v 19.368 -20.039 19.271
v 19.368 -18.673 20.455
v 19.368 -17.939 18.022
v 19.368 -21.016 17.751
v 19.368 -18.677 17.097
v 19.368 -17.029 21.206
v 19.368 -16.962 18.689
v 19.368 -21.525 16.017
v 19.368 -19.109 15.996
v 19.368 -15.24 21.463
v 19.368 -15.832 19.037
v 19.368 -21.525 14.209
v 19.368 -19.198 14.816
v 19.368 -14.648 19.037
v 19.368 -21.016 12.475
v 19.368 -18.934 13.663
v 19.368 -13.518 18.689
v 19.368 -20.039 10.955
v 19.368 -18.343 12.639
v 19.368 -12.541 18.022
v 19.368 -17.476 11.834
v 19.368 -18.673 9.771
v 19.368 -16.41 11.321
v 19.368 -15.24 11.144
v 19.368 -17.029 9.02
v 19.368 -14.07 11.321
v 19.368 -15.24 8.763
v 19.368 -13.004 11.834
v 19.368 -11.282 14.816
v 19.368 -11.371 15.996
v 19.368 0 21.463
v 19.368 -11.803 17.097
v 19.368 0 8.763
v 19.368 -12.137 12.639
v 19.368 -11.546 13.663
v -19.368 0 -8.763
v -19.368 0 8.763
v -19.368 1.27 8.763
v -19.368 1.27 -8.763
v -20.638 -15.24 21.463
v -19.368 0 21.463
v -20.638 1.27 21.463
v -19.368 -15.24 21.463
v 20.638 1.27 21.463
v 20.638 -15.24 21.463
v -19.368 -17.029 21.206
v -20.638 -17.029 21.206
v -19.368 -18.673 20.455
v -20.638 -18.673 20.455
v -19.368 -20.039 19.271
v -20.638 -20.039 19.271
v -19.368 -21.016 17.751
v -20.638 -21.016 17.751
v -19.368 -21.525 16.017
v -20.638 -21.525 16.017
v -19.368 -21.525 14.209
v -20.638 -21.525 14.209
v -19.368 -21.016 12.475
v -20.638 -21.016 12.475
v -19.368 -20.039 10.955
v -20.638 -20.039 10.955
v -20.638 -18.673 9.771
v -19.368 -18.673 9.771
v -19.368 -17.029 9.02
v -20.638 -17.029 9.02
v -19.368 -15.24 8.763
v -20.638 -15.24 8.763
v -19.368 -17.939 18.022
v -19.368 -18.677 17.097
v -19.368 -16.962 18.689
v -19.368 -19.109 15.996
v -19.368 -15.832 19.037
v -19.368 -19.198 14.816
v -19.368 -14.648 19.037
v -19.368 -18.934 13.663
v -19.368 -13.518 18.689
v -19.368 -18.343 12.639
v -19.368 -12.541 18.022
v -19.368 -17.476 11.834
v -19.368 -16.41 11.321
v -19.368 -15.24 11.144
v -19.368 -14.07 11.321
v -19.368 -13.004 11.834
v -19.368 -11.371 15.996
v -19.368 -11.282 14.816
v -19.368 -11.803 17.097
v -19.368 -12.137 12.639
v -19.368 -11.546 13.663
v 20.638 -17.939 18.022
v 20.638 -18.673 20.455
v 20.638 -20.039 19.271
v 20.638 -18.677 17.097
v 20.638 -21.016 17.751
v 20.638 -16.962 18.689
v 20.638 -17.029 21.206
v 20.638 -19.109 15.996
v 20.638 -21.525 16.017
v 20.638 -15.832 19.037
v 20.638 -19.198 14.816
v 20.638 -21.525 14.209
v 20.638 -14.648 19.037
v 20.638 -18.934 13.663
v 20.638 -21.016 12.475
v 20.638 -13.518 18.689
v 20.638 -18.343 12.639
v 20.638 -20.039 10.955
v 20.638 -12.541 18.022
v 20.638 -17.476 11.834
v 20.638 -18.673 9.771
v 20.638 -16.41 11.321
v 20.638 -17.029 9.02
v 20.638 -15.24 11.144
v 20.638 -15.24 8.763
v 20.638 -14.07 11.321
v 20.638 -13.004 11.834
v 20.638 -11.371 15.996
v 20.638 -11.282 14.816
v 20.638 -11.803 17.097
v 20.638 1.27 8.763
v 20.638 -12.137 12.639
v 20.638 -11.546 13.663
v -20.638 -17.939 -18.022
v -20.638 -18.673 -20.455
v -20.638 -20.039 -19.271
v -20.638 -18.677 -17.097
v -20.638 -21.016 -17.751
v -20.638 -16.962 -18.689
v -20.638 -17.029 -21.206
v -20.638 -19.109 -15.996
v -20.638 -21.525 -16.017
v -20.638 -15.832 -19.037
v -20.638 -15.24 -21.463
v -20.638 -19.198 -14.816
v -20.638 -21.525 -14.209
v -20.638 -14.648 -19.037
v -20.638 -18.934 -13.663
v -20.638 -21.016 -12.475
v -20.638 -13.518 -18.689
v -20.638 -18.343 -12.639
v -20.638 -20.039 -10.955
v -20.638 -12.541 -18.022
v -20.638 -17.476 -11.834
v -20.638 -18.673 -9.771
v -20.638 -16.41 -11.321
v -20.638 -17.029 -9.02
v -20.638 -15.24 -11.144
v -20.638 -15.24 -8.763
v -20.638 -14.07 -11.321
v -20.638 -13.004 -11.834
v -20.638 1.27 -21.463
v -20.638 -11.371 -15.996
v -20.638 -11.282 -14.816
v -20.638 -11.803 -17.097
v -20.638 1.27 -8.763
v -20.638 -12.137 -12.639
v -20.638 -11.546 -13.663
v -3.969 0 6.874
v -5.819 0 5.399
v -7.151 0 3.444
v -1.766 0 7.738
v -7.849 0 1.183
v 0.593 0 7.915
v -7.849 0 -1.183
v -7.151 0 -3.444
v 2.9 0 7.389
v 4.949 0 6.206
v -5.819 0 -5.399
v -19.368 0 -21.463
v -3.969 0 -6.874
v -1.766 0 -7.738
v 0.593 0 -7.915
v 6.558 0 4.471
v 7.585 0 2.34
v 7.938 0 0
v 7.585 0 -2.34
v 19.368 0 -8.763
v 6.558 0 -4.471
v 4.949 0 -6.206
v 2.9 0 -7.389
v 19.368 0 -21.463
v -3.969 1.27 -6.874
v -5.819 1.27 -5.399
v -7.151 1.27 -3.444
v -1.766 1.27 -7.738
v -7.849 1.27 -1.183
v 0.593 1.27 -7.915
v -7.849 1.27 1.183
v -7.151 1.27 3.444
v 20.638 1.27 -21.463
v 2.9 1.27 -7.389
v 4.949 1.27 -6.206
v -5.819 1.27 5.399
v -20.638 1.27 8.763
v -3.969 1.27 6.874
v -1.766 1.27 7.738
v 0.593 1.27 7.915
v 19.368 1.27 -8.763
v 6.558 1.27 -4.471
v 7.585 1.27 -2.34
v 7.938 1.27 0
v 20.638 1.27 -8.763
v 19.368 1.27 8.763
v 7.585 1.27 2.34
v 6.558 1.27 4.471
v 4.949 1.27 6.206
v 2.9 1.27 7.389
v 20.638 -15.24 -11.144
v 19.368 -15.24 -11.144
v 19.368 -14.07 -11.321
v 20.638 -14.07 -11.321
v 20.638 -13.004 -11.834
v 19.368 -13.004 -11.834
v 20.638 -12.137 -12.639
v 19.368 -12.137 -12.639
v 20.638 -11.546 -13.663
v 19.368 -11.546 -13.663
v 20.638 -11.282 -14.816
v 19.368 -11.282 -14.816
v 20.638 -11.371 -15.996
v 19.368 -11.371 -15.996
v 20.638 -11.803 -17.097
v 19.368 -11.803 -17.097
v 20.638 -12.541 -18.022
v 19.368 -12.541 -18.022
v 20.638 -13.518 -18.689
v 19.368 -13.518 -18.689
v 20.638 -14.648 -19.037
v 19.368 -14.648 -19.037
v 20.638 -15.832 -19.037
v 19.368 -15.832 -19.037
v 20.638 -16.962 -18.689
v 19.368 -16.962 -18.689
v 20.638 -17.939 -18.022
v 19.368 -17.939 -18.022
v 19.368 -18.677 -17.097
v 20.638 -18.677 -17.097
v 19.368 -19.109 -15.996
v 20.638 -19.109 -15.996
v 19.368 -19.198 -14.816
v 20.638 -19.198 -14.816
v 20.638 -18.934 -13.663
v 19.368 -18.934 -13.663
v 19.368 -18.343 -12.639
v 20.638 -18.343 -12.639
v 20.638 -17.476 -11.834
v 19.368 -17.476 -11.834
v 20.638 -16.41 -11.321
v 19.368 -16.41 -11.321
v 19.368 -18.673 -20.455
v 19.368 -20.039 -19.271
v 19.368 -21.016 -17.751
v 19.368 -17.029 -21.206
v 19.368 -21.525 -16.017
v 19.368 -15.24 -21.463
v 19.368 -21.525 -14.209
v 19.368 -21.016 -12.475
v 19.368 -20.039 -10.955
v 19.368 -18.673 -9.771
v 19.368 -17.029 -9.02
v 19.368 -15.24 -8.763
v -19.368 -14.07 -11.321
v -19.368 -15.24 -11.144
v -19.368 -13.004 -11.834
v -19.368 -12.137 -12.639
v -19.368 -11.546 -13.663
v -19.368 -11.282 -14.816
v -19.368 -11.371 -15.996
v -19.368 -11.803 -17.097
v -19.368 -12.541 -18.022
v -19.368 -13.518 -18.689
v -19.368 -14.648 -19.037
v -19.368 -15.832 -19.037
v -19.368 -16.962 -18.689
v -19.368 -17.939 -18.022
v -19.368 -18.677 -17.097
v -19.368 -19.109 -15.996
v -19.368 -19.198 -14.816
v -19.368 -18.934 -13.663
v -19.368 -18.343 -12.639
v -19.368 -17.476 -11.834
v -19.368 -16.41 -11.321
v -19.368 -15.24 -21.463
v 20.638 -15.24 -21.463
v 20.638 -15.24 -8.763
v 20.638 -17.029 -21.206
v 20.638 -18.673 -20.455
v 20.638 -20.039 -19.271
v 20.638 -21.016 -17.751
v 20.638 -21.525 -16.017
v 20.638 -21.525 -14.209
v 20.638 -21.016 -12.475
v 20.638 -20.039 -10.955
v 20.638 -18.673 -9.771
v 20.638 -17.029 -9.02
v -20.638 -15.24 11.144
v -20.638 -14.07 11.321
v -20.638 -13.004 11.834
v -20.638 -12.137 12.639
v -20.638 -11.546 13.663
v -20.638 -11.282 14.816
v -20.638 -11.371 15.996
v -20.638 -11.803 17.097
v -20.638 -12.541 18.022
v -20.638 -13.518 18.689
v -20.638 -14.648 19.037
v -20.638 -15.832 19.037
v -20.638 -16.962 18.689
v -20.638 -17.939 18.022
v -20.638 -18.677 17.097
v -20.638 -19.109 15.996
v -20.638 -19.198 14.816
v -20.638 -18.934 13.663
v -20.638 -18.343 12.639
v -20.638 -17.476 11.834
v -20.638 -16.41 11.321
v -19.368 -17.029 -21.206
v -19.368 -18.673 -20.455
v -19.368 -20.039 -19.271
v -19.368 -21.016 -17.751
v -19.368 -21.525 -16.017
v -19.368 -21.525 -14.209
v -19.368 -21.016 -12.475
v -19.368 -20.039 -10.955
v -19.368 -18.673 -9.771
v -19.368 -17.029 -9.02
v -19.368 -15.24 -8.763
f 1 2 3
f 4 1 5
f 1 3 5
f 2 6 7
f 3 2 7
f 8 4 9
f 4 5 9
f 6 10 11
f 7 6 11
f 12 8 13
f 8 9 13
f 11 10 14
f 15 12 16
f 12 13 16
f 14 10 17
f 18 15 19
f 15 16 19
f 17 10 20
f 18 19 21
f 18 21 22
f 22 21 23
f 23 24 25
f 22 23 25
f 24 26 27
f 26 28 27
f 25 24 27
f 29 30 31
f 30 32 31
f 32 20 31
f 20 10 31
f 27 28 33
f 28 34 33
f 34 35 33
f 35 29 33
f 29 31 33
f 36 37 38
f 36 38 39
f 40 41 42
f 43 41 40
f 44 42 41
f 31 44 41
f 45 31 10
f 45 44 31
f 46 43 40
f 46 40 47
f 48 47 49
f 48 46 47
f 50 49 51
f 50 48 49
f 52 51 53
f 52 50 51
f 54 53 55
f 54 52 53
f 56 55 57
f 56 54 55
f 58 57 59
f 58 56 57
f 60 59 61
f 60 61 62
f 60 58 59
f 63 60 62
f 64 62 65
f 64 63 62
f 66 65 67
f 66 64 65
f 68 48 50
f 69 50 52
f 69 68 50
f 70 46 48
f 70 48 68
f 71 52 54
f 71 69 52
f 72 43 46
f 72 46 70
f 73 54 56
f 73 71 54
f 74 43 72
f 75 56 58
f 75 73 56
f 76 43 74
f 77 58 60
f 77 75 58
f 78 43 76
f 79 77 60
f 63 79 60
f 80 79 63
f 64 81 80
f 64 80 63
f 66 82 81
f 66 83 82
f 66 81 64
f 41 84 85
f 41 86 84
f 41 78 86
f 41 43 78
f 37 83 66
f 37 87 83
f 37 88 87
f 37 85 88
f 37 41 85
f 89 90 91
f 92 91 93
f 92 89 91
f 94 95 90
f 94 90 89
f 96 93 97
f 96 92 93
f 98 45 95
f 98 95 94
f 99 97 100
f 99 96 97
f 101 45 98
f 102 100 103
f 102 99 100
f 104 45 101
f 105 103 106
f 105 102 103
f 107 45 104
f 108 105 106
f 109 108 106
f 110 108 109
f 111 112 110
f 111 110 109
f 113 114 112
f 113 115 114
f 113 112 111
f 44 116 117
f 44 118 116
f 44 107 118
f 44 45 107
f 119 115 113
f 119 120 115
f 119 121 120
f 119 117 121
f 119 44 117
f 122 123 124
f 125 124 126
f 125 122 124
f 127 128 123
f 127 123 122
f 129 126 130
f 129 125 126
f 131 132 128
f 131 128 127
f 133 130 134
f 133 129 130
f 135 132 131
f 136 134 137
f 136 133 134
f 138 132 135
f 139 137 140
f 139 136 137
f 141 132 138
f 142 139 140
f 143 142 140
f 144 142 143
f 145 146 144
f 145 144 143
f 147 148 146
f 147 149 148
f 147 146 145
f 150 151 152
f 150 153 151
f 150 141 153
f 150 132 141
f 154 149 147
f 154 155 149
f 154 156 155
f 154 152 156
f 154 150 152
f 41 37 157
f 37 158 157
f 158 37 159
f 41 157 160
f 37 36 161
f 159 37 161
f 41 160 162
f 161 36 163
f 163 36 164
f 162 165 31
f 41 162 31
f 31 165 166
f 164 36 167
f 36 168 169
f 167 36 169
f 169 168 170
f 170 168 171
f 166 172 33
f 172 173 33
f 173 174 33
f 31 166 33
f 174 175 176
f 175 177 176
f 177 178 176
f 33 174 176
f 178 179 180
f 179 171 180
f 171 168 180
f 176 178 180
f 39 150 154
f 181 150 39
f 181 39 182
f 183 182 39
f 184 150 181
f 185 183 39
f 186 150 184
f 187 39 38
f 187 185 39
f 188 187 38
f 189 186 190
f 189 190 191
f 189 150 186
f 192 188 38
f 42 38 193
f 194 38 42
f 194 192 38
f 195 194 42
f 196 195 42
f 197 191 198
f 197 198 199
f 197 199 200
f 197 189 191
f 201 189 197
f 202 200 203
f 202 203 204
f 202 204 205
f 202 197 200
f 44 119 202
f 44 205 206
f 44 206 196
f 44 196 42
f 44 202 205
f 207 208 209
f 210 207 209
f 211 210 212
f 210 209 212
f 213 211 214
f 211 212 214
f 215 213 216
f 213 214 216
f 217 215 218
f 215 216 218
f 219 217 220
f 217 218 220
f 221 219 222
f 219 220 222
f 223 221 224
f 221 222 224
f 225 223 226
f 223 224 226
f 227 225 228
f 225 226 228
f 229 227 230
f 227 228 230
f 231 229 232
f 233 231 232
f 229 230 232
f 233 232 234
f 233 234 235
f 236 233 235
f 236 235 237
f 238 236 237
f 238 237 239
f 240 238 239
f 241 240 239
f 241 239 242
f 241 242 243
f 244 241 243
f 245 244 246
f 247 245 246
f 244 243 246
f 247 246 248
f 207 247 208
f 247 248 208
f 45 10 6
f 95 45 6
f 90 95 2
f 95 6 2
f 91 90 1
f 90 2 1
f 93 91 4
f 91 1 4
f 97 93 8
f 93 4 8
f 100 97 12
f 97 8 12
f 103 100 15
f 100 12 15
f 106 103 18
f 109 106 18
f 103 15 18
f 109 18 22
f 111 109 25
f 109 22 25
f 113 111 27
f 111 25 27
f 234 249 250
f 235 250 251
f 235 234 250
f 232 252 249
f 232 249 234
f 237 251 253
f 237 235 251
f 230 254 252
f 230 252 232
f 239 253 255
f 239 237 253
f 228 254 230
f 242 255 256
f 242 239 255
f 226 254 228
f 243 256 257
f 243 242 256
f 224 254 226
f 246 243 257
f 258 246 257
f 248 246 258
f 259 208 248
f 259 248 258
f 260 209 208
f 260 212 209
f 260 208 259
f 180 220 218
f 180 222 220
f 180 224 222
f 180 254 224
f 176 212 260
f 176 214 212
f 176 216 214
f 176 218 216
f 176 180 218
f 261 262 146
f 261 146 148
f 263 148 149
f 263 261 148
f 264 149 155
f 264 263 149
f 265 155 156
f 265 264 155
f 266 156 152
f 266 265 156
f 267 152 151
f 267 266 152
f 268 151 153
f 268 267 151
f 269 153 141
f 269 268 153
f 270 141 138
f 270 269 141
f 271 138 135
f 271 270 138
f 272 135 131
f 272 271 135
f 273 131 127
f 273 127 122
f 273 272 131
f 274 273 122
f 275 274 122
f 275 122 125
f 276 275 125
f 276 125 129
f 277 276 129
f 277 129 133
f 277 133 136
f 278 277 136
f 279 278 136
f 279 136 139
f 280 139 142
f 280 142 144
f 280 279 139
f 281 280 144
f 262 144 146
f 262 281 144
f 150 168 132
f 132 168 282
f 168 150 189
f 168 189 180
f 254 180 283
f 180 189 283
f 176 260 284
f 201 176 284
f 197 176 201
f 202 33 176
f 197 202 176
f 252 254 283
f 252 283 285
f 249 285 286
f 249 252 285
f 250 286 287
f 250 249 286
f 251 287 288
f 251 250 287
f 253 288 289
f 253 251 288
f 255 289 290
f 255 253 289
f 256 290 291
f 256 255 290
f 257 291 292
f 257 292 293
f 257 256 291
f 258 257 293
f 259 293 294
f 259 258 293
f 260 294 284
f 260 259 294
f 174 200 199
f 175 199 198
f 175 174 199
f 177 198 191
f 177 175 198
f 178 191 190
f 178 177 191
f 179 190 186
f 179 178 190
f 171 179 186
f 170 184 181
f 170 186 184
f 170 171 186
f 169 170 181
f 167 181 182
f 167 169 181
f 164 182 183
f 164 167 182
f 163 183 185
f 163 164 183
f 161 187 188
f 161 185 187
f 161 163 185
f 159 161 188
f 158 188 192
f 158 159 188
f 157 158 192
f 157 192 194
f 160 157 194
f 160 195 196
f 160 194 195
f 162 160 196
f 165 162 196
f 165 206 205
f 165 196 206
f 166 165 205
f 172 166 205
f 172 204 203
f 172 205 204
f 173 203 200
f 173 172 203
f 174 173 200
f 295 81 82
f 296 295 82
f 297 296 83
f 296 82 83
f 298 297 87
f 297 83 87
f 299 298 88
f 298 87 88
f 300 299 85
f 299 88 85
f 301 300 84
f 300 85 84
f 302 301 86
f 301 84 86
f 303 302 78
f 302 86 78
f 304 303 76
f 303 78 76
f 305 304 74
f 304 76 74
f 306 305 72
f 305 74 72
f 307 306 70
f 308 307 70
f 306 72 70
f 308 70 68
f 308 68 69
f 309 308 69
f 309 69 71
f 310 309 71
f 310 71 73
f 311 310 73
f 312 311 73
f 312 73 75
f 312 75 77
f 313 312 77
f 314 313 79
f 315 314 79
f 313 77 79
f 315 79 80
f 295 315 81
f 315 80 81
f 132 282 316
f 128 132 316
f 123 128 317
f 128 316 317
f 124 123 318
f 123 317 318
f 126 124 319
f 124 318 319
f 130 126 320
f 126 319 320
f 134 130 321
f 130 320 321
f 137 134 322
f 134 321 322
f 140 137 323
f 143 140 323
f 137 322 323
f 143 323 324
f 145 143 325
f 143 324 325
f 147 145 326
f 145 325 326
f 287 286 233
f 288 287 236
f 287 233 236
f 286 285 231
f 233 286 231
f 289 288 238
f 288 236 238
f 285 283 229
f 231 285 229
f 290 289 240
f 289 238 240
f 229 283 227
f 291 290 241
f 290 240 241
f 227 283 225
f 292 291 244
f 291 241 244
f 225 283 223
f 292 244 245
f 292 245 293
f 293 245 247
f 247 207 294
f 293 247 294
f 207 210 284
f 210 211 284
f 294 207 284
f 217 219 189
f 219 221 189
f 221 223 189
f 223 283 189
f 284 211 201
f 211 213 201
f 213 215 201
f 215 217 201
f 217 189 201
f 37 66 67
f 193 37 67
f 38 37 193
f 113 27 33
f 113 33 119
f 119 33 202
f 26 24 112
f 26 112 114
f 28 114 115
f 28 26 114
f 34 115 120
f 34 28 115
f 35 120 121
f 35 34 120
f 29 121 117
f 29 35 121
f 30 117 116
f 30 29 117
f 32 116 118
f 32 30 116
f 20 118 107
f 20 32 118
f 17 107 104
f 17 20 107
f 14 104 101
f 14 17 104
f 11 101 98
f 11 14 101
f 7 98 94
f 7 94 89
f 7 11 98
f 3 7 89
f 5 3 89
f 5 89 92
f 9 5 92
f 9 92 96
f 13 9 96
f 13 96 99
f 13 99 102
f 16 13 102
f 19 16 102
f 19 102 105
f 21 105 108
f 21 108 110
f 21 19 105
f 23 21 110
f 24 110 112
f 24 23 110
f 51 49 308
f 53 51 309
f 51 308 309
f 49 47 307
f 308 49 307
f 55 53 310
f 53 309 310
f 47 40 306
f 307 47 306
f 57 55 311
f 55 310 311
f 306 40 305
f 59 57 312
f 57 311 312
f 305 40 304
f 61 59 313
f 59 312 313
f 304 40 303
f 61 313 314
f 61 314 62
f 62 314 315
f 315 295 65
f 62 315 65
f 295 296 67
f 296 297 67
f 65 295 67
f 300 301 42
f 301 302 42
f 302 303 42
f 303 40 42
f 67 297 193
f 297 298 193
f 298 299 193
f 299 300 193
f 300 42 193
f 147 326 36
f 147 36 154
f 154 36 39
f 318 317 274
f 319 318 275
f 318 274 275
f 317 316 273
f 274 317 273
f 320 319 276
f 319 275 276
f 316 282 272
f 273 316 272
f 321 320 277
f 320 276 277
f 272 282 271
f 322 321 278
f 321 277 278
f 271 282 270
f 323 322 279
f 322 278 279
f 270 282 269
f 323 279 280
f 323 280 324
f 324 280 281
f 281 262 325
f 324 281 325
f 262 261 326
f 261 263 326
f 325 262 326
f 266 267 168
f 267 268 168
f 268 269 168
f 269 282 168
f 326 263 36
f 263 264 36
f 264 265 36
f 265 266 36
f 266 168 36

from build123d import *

# Parameters (mm, degrees)
SKETCH1_W               = 38.735
SKETCH1_H               = 42.926
BOSS_EXTRUDE1_DEPTH     = 1.27
SKETCH5_R               = 3.96875
SKETCH5_W               = 12.7
SKETCH5_H               = 1.27
BOSS_EXTRUDE3_DEPTH     = 1.27
MIRROR2_COPY_1_SKETCH_R = 3.96875
MIRROR2_COPY_1_SKETCH_W = 12.7
MIRROR2_COPY_1_SKETCH_H = 1.27
MIRROR2_COPY_1_DEPTH    = 1.27
SKETCH6_R               = 7.9375
CUT_EXTRUDE1_DEPTH      = 2.27
CUT_EXTRUDE1_DEPTH_BACK = 22.59


with BuildPart() as part:
    # Sketch1 → Boss-Extrude1 (new body)
    with BuildSketch(Plane(origin=(0, 0, 0), x_dir=(1, 0, 0), z_dir=(0, 1, 0))):
        Rectangle(SKETCH1_W, SKETCH1_H)
    extrude(amount=BOSS_EXTRUDE1_DEPTH)

    # Sketch5 → Boss-Extrude3 (add)
    with BuildSketch(Plane(origin=(19.3675, 0, 0), x_dir=(0, 0, -1), z_dir=(1, 0, 0))):
        with BuildLine():
            Line((-8.763, 0), (-21.463, 0))
            Line((-21.463, 0), (-21.463, -15.24))
            ThreePointArc((-21.463, -15.24), (-15.113, -21.59), (-8.763, -15.24))
            Line((-8.763, -15.24), (-8.763, 0))
        make_face()
        with Locations((-15.113, -15.24)):
            Circle(SKETCH5_R, mode=Mode.SUBTRACT)
        with Locations((-15.113, 0.635)):
            Rectangle(SKETCH5_W, SKETCH5_H)
    boss_extrude3 = extrude(amount=BOSS_EXTRUDE3_DEPTH)

    # Mirror1: Boss-Extrude3 across plane
    add(boss_extrude3.mirror(Plane.XY))

    # Mirror2: Boss-Extrude3 across plane
    add(boss_extrude3.mirror(Plane(origin=(0, 0, 0), x_dir=(0, 0, 1), z_dir=(1, 0, 0))))

    # Mirror2 copy 1 sketch → Mirror2 copy 1 (add)
    with BuildSketch(Plane.ZY.offset(19.3675)):
        with BuildLine():
            Line((-8.763, 0), (-21.463, 0))
            Line((-21.463, 0), (-21.463, -15.24))
            ThreePointArc((-21.463, -15.24), (-15.113, -21.59), (-8.763, -15.24))
            Line((-8.763, -15.24), (-8.763, 0))
        make_face()
        with Locations((-15.113, -15.24)):
            Circle(MIRROR2_COPY_1_SKETCH_R, mode=Mode.SUBTRACT)
        with Locations((-15.113, 0.635)):
            Rectangle(MIRROR2_COPY_1_SKETCH_W, MIRROR2_COPY_1_SKETCH_H)
    extrude(amount=MIRROR2_COPY_1_DEPTH)

    # Sketch6 → Cut-Extrude1 (cut, two sides)
    with BuildSketch(Plane(origin=(0, 0, 0), x_dir=(1, 0, 0), z_dir=(0, 1, 0))) as cut_extrude1_sk:
        Circle(SKETCH6_R)
    extrude(amount=CUT_EXTRUDE1_DEPTH, mode=Mode.SUBTRACT)
    extrude(cut_extrude1_sk.sketch, amount=-CUT_EXTRUDE1_DEPTH_BACK, mode=Mode.SUBTRACT)


solid = part.part
